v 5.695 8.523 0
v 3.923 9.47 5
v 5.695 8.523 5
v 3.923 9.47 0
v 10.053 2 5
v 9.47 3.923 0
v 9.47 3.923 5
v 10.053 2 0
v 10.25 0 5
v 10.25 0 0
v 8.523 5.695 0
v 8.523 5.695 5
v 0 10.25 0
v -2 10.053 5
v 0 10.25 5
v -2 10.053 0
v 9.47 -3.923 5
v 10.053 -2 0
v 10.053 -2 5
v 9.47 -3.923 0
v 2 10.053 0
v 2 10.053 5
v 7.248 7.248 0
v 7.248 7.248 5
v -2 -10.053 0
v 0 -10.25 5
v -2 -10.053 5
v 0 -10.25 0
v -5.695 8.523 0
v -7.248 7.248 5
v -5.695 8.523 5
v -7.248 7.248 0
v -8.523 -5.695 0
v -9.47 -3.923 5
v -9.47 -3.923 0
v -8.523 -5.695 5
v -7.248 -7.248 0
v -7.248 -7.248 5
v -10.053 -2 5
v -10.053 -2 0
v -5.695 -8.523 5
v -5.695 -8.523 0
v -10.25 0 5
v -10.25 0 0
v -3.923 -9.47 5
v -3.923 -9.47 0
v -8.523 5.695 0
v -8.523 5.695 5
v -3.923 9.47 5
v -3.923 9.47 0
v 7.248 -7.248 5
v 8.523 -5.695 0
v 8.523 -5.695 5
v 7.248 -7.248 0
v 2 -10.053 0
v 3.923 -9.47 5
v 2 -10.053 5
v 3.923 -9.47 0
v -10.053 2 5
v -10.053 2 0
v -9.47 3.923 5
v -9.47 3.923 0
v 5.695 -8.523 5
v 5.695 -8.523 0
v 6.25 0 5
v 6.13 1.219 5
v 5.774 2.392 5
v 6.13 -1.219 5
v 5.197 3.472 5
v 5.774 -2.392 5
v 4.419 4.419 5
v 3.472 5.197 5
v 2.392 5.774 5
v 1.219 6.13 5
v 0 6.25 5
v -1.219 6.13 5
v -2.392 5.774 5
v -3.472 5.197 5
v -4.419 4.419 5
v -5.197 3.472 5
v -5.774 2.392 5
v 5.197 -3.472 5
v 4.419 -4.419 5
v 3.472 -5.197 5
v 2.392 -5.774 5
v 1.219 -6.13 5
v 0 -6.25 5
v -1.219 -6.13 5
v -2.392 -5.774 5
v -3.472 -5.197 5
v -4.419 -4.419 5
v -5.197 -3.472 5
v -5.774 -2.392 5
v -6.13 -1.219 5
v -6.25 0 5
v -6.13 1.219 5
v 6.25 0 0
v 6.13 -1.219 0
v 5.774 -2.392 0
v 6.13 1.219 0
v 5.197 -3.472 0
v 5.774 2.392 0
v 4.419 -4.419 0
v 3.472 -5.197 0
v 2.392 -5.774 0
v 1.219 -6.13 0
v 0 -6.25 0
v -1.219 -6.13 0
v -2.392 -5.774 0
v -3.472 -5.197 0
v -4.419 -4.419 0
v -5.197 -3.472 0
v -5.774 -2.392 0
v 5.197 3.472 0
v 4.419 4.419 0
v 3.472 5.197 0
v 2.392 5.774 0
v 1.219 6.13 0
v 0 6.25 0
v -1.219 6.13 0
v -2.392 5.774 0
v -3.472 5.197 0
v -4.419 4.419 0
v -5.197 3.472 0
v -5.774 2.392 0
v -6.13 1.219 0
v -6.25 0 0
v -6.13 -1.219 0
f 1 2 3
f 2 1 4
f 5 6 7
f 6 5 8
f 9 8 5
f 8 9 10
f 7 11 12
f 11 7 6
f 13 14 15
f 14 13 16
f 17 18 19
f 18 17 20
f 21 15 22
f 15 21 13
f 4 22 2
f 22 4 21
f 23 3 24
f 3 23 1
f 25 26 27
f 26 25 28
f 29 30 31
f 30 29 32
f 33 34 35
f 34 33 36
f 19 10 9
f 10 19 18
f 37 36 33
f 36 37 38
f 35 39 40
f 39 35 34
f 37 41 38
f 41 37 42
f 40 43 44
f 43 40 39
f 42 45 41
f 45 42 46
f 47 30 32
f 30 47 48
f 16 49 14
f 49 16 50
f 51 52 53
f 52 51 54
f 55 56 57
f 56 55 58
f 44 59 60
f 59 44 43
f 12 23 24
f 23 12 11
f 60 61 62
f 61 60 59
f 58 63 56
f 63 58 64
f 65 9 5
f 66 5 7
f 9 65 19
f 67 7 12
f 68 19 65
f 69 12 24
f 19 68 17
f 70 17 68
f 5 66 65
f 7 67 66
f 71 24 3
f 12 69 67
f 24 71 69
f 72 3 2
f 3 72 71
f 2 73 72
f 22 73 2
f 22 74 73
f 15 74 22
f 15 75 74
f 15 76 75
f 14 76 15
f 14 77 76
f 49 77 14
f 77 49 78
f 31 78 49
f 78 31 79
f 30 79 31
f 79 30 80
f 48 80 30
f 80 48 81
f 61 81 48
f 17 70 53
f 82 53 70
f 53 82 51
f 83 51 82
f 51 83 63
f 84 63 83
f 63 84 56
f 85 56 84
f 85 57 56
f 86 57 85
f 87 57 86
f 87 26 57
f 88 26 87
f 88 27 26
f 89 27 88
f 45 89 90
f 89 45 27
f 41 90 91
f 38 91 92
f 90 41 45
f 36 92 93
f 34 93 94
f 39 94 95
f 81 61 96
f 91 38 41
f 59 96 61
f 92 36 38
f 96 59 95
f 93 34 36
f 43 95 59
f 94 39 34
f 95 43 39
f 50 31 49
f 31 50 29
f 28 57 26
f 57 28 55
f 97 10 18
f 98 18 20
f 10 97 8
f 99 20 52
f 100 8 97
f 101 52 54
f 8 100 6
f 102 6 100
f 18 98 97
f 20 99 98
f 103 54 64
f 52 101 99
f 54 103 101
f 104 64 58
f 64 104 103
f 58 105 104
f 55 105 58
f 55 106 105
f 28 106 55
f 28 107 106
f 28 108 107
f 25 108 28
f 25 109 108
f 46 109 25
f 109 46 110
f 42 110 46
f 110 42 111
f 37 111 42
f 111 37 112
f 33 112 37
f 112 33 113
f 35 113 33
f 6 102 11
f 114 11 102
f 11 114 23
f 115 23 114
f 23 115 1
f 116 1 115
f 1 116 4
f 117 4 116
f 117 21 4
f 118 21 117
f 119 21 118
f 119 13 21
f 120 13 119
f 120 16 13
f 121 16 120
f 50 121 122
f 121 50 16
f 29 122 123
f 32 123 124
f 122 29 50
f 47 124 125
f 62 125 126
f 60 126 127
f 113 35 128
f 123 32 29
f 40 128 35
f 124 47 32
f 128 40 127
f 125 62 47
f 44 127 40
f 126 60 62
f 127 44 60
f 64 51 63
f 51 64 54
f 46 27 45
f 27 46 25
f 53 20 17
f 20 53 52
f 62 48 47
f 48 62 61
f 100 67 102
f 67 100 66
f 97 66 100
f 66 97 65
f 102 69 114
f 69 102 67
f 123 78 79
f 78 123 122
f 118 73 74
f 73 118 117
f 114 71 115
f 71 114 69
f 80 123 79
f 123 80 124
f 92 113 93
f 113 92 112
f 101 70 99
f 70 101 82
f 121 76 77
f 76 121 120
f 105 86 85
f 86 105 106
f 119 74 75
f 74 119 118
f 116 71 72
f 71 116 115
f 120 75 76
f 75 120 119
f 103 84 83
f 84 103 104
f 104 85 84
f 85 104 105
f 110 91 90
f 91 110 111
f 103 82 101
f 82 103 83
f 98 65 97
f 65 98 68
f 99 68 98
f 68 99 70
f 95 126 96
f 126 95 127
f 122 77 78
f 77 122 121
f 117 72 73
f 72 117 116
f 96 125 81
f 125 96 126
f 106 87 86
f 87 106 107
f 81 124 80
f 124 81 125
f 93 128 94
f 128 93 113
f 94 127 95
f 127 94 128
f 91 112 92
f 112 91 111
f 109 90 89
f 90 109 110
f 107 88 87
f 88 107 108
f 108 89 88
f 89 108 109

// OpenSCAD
$fn = 32;

// ----------------------------------------------------------------------
// Spacer sleeve: 20.5 / 12.5 x 5 mm
// ----------------------------------------------------------------------

// --- parameters (mm) ---
outer_d = 20.5;           // outside diameter
inner_d = 12.5;           // shaft bore
length = 5;               // sleeve length

module sleeve() {
  cylinder(h = length, d = outer_d);
}

difference() {
  sleeve();
  translate([0, 0, -1]) cylinder(h = length + 2, d = inner_d);
}
